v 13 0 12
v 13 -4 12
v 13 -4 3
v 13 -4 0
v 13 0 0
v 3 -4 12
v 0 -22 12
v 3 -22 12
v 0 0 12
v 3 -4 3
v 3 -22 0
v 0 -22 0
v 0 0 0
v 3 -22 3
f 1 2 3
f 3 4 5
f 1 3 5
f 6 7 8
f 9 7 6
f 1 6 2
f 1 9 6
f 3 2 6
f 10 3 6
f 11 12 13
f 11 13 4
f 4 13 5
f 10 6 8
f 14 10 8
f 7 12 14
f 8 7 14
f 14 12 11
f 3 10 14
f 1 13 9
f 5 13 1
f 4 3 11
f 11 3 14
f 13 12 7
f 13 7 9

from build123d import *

# Parameters (mm, degrees)
F0_W     = 13
F0_H     = 22
F1_DEPTH = 12
F3_DEPTH = 12.001
F5_DEPTH = 9


with BuildPart() as f1:
    # F0 (on Top) → F1 (new body)
    with BuildSketch(Plane.XY):
        with Locations((6.5, -11)):
            Rectangle(F0_W, F0_H)
    extrude(amount=F1_DEPTH)

    # F2 (on face) → F3 (cut, through all)
    with BuildSketch(Plane.XY.offset(12)):
        Polygon((13, -22), (13, -4), (3, -22), align=None)
    extrude(amount=-F3_DEPTH, mode=Mode.SUBTRACT)

    # F4 (on face) → F5 (cut)
    with BuildSketch(Plane.XY.offset(12)):
        Polygon((3, -4), (3, -22), (13, -4), align=None)
    extrude(amount=-F5_DEPTH, mode=Mode.SUBTRACT)


solid = f1.part
